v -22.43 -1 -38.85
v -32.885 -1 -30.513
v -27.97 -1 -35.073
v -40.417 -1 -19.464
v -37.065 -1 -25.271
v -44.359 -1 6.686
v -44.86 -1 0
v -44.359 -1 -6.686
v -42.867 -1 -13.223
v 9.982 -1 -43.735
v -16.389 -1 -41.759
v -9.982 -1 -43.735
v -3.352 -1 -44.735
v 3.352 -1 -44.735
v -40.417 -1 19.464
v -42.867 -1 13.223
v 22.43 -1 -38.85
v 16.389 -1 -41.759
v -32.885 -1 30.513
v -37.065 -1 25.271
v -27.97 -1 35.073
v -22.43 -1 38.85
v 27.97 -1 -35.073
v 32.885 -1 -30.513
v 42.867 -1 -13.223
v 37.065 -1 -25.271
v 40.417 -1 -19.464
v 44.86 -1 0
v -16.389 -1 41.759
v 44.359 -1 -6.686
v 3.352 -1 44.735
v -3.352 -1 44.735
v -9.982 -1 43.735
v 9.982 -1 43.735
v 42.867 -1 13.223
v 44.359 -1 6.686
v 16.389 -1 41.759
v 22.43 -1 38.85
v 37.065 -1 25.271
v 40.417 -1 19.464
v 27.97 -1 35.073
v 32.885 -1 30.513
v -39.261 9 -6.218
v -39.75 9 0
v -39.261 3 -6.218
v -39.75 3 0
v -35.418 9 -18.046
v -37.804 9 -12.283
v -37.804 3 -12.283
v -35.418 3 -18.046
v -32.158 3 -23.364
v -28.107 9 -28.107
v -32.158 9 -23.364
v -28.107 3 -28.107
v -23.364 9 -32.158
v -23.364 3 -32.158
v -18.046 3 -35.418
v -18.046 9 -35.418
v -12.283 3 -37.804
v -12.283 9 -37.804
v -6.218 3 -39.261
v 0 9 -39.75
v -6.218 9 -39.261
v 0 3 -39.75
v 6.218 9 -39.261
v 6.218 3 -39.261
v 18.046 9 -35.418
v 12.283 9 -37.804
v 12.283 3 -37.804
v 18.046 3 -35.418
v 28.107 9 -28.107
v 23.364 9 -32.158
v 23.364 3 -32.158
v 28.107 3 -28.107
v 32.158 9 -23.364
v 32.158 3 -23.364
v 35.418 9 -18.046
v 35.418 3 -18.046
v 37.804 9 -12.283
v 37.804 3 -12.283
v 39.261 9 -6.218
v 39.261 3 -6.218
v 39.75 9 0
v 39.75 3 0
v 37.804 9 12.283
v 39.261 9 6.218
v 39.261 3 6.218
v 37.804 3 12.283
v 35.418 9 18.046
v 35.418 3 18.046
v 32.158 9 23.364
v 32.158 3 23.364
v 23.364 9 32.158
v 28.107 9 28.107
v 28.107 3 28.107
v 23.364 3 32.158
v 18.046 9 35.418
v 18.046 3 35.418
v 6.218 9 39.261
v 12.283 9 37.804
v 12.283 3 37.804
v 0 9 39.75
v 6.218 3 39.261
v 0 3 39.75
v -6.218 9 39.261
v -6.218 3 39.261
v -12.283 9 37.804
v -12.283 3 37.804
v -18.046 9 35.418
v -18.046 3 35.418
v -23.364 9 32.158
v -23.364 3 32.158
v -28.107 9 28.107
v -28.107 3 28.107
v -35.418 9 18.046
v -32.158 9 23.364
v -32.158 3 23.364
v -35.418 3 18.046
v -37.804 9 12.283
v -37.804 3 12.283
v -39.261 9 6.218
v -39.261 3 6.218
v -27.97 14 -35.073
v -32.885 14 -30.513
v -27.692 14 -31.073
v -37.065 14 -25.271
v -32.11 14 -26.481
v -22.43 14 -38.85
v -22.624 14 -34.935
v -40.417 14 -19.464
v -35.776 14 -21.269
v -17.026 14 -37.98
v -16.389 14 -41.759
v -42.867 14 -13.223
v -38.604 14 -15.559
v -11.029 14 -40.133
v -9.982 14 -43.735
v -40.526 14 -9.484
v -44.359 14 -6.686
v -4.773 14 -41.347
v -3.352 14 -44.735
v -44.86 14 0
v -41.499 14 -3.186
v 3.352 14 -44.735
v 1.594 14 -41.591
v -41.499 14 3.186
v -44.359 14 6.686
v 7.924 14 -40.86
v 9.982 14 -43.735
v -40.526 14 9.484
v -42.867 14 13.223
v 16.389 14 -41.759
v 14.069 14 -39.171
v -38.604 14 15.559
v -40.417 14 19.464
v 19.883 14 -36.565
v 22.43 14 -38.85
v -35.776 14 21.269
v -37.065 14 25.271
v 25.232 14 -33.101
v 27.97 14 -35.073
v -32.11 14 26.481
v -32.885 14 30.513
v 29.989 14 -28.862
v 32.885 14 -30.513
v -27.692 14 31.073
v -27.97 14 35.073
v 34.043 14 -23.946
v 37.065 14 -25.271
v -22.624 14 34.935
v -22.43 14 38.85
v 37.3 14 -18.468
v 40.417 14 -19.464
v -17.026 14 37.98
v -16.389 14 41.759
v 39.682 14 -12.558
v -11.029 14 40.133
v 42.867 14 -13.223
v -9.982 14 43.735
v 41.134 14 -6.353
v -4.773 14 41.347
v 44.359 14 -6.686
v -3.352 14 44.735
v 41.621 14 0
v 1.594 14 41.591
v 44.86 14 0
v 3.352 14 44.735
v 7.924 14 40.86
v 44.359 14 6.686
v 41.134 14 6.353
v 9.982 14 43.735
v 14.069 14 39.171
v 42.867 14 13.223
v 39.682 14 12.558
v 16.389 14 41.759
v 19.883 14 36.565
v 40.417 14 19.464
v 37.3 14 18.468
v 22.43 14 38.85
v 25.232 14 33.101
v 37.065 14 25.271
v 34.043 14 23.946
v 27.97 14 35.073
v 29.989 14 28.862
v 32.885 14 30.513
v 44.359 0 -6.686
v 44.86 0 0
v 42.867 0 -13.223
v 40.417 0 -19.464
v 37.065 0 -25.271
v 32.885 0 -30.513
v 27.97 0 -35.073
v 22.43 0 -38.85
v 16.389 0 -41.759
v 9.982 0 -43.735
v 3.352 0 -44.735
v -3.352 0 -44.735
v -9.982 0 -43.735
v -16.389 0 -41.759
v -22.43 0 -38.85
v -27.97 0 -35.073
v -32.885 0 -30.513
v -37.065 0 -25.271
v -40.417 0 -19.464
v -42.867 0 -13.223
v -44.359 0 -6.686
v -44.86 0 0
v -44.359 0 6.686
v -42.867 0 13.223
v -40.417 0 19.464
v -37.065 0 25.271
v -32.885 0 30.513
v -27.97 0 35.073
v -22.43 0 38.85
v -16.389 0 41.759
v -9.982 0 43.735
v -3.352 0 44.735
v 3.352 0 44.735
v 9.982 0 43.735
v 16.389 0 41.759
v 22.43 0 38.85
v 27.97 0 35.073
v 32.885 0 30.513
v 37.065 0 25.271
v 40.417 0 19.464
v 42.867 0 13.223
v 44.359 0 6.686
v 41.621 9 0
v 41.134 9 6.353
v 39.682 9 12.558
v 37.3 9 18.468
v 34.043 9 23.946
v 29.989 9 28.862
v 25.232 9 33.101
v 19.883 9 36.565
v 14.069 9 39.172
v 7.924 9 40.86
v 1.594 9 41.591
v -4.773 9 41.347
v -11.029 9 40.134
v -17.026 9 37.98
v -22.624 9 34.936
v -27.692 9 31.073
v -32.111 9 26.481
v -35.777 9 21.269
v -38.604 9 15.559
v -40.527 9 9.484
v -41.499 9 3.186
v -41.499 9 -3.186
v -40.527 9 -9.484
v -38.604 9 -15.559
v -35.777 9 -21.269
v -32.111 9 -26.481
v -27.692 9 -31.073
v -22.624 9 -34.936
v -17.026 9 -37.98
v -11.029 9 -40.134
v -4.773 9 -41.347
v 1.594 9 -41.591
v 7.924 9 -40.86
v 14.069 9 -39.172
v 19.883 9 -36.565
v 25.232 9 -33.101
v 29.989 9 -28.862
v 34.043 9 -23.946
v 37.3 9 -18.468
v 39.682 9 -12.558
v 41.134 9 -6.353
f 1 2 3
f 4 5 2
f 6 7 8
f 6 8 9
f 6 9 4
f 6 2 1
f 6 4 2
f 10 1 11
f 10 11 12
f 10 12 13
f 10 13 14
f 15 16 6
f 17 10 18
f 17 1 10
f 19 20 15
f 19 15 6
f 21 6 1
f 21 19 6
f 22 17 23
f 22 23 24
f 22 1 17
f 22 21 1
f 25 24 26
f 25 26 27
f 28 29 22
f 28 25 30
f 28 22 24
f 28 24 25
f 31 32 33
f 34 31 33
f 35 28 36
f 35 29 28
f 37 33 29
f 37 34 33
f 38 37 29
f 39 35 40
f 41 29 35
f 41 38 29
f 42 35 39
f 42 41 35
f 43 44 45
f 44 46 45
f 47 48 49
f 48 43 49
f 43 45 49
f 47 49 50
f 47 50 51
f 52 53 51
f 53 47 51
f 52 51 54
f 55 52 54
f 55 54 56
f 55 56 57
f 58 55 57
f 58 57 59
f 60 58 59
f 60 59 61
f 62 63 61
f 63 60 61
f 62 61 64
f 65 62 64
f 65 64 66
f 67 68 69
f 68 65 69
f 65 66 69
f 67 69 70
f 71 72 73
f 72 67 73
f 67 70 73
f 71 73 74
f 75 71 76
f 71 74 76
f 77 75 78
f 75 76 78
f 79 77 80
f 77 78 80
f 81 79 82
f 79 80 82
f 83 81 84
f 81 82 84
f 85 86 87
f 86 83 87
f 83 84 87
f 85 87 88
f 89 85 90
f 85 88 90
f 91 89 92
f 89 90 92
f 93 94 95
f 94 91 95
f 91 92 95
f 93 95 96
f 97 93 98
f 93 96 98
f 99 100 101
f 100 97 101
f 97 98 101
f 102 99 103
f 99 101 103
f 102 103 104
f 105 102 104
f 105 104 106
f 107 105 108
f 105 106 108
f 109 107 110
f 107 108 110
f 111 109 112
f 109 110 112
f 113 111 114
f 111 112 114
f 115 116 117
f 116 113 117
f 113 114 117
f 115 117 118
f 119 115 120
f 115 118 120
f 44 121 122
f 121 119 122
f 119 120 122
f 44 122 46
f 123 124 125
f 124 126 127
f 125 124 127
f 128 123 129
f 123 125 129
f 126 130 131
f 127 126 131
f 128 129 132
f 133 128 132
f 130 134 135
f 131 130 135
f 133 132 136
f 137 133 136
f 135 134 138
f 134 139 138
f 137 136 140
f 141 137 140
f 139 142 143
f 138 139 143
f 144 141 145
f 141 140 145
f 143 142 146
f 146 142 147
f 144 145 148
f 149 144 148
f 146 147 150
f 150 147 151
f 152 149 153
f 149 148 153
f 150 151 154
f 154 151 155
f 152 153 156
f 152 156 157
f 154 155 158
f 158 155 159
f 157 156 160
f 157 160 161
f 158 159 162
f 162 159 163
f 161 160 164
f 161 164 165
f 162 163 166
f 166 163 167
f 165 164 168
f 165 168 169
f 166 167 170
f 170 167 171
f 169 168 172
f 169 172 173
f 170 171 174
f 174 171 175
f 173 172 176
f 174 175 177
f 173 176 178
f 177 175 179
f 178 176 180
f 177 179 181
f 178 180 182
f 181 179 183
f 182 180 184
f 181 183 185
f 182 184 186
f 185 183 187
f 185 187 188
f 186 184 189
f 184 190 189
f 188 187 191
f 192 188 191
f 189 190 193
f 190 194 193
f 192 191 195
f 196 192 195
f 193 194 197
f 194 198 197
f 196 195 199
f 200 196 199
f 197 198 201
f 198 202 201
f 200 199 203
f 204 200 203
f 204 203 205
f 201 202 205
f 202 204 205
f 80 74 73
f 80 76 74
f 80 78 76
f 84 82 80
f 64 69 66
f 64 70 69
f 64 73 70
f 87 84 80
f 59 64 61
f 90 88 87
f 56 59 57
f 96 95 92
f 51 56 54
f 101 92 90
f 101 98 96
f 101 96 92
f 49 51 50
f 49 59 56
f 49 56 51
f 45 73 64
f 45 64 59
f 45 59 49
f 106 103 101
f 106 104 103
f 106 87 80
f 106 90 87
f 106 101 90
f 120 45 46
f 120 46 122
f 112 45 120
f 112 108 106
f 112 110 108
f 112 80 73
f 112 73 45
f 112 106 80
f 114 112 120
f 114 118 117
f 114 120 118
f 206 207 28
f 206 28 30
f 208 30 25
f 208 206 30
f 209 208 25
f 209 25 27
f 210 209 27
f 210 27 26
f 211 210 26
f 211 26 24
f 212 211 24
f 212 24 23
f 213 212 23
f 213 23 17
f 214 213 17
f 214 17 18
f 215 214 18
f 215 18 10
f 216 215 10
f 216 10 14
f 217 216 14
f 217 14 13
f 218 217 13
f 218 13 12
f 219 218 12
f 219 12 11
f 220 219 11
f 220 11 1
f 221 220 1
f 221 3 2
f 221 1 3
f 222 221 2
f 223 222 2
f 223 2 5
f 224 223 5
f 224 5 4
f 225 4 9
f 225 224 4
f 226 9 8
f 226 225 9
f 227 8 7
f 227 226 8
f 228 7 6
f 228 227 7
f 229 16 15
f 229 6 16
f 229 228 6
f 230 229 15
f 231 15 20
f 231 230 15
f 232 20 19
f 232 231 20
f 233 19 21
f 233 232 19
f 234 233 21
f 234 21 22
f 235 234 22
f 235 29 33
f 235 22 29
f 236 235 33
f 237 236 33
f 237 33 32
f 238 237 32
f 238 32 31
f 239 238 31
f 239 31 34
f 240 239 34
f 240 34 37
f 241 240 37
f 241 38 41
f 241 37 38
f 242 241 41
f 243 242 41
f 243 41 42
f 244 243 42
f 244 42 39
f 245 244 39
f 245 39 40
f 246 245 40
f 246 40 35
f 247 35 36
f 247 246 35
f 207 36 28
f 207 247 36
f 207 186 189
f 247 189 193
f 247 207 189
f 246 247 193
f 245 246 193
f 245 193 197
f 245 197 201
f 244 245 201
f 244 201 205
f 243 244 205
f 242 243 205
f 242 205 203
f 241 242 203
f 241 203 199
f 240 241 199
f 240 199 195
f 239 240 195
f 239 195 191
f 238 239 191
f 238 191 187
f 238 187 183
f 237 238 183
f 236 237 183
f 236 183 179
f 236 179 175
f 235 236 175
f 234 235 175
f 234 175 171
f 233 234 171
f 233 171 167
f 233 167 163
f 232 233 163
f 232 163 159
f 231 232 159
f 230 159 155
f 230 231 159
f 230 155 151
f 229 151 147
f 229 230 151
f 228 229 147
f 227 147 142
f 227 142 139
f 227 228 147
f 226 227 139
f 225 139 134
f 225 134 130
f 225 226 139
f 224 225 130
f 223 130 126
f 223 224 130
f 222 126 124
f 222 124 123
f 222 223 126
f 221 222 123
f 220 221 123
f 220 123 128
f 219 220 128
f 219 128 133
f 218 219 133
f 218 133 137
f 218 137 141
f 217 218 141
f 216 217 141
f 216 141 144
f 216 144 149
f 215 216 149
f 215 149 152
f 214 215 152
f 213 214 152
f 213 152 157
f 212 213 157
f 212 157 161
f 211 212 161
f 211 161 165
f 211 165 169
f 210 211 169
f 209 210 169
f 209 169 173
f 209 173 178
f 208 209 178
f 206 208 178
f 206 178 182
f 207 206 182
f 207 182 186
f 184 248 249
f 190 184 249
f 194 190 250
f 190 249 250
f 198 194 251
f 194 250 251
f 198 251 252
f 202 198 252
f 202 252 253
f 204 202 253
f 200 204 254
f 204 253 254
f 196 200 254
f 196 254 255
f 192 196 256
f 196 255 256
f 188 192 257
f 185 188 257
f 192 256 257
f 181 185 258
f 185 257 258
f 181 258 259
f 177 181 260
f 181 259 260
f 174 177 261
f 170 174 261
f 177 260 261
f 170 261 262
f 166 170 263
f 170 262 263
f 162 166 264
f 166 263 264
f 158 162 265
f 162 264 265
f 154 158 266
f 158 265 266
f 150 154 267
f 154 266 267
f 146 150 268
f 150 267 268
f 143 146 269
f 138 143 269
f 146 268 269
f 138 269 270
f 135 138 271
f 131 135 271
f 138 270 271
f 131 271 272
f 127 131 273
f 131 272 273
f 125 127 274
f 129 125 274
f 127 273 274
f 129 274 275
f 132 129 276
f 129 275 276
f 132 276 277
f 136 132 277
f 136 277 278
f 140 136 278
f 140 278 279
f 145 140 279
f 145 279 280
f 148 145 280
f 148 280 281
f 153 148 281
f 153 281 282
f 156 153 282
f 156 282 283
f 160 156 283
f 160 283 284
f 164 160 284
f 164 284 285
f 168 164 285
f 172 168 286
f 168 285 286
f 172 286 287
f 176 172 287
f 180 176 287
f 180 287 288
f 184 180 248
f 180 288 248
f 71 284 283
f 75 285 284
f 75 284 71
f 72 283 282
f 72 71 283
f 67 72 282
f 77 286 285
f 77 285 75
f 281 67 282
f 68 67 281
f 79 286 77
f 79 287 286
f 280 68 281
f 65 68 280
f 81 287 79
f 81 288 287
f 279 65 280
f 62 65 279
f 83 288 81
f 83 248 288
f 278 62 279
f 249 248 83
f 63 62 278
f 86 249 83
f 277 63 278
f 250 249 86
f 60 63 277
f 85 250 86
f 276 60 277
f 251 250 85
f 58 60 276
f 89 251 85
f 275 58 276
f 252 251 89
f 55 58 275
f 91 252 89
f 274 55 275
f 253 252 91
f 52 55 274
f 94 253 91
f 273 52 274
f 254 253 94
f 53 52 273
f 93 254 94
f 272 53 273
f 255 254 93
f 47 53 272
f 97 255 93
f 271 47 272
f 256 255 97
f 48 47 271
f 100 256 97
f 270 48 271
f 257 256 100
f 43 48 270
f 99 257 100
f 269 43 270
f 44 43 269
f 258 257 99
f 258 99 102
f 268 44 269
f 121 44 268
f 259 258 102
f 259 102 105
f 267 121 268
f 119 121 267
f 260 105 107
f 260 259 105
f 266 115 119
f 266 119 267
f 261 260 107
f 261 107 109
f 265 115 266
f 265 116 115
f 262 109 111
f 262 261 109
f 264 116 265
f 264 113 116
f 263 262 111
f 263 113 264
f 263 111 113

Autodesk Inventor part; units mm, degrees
ref_plane "YZ Plane" through (0, 0, 0) normal (1, 0, 0) x (0, 1, 0)
ref_plane "XZ Plane" through (0, 0, 0) normal (0, 1, 0) x (-1, 0, 0)
ref_plane "XY Plane" through (0, 0, 0) normal (0, 0, 1) x (1, 0, 0)
sketch "Sketch4" plane through (0, 0, 0) normal (0, 1, 0) x (-1, 0, 0)
  circle A0 centre (0, 0) radius 39.75
  circle A1 centre (0, 0) radius 41.6215
  circle A2 centre (0, 0) radius 41.6213
  dimension "d17" = 79.5
  dimension "d18" = 83.243
sketch "Sketch6" plane through (0, 0, 0) normal (0, 1, 0) x (-1, 0, 0)
  circle A0 centre (0, 0) radius 39.7618
extrude "Extrusion1" add sketch "Sketch6" along normal blind 3
extrude "Extrusion2" add sketch "Sketch4" along normal blind 9
sketch "Sketch7" plane through (0, 0, 0) normal (0, -1, 0) x (1, 0, 0)
  circle A0 centre (0, 0) radius 44.86
  circle A1 centre (0, 0) radius 41.6213
extrude "Extrusion3" add sketch "Sketch7" against normal blind 14
sketch "Sketch8" plane through (0, 0, 0) normal (0, -1, 0) x (1, 0, 0)
  circle A0 centre (0, 0) radius 44.86
extrude "Extrusion4" add sketch "Sketch8" along normal blind 1
properties part number "Soft Coating Gripper mold_6mil"
